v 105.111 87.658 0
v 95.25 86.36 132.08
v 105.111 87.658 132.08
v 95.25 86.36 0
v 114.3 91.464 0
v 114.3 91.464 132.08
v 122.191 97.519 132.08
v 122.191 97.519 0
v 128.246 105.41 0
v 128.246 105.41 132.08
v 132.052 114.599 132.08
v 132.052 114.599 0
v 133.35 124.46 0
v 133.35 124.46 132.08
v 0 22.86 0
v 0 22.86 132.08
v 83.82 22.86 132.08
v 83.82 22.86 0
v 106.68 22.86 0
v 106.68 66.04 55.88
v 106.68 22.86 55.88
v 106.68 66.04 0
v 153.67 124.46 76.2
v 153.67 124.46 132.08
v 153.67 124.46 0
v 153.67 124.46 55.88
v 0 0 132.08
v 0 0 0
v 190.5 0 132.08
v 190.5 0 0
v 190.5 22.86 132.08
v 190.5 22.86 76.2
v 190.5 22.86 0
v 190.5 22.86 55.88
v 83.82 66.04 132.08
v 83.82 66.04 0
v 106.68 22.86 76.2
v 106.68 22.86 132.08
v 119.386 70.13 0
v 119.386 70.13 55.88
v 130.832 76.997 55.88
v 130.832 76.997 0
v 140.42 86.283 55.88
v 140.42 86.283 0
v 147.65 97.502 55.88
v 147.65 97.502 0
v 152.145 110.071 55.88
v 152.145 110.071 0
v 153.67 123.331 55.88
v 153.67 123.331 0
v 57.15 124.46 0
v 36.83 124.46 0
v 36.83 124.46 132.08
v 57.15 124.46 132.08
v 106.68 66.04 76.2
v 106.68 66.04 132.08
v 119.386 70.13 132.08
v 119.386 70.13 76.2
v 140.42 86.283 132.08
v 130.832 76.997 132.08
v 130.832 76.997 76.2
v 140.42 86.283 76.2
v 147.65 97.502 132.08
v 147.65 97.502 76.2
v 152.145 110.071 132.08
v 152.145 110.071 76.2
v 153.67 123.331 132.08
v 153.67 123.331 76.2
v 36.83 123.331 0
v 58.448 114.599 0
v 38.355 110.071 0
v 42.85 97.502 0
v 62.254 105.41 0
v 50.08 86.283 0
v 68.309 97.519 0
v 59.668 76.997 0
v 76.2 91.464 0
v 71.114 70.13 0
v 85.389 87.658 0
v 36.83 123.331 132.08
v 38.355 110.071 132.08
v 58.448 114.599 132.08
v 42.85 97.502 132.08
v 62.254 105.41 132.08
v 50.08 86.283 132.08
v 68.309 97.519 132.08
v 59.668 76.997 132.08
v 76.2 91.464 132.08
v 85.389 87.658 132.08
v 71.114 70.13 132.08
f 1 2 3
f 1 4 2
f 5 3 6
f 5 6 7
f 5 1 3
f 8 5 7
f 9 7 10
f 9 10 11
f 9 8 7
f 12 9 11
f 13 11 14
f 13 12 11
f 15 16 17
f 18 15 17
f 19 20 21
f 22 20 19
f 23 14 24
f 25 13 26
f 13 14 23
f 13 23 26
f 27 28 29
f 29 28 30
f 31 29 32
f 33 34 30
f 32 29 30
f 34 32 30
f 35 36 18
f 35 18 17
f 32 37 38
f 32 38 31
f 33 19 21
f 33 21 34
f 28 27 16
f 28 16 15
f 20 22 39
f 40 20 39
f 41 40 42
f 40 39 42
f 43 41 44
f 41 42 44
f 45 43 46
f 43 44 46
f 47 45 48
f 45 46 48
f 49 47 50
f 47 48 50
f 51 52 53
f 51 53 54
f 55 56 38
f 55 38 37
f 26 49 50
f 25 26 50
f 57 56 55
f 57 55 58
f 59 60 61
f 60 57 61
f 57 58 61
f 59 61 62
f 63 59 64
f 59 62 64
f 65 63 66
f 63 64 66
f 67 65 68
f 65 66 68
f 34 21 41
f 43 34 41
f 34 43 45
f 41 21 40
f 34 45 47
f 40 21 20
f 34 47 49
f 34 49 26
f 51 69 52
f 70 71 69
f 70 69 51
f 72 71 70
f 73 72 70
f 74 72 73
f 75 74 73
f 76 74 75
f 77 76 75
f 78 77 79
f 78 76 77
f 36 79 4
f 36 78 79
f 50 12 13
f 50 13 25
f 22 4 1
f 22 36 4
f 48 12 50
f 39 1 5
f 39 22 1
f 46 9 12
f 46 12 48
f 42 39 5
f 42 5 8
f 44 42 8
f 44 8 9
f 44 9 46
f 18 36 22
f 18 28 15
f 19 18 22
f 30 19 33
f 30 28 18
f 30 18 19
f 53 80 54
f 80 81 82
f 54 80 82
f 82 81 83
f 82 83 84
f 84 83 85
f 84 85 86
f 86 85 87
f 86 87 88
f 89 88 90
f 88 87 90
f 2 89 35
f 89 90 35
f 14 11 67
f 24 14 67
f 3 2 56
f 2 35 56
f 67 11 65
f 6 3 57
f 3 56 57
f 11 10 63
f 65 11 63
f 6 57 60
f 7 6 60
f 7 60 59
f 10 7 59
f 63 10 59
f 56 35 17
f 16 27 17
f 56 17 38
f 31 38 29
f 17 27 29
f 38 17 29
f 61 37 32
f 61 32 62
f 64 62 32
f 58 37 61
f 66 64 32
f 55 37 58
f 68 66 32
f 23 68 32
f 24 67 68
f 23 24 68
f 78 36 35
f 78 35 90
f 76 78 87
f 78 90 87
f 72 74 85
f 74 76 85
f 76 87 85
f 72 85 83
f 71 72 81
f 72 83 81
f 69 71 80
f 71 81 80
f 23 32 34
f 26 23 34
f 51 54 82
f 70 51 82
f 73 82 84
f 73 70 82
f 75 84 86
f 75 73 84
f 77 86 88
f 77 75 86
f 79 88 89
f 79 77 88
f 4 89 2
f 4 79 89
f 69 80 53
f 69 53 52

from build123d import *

# Parameters (mm, degrees)
SKETCH1_W           = 190.5
SKETCH1_H           = 132.08
BOSS_EXTRUDE1_DEPTH = 22.86
SKETCH2_W           = 116.84
SKETCH2_H           = 132.08
BOSS_EXTRUDE2_DEPTH = 101.6
SKETCH3_W           = 20.32
SKETCH3_H           = 101.6
BOSS_EXTRUDE3_DEPTH = 36.83
SKETCH5_W           = 55.88
SKETCH5_H           = 43.18
CUT_EXTRUDE1_DEPTH  = 46.99
SKETCH4_W           = 55.88
SKETCH4_H           = 43.18
CUT_EXTRUDE2_DEPTH  = 46.99
SKETCH6_W           = 132.08
SKETCH6_H           = 43.18
CUT_EXTRUDE3_DEPTH  = 46.99
SKETCH10_W          = 76.2
SKETCH10_H          = 132.08
CUT_EXTRUDE4_DEPTH  = 38.1
CHAMFER1_SIZE       = 36.83
CHAMFER1_SIZE2      = 101.6
FILLET1_R           = 58.42
FILLET2_R           = 38.1


# Some blends are built 0.0001 mm under size
with BuildPart() as part:
    # Sketch1 → Boss-Extrude1 (new body)
    with BuildSketch(Plane(origin=(0, 0, 0), x_dir=(1, 0, 0), z_dir=(0, 1, 0))):
        with Locations((95.25, -66.04)):
            Rectangle(SKETCH1_W, SKETCH1_H)
    extrude(amount=BOSS_EXTRUDE1_DEPTH)

    # Sketch2 → Boss-Extrude2 (add)
    with BuildSketch(Plane(origin=(0, 22.86, 0), x_dir=(1, 0, 0), z_dir=(0, 1, 0))):
        with Locations((95.25, -66.04)):
            Rectangle(SKETCH2_W, SKETCH2_H)
    extrude(amount=BOSS_EXTRUDE2_DEPTH)

    # Sketch3 → Boss-Extrude3 (add)
    with BuildSketch(Plane(origin=(153.67, 0, 0), x_dir=(0, 0, -1), z_dir=(1, 0, 0))):
        with Locations((-66.04, 73.66)):
            Rectangle(SKETCH3_W, SKETCH3_H)
    extrude(amount=BOSS_EXTRUDE3_DEPTH)

    # Sketch5 → Cut-Extrude1 (cut)
    with BuildSketch(Plane(origin=(153.67, 0, 0), x_dir=(0, 0, -1), z_dir=(1, 0, 0))):
        with Locations((-27.94, 44.45)):
            Rectangle(SKETCH5_W, SKETCH5_H)
    extrude(amount=-CUT_EXTRUDE1_DEPTH, mode=Mode.SUBTRACT)

    # Sketch4 → Cut-Extrude2 (cut)
    with BuildSketch(Plane(origin=(153.67, 0, 0), x_dir=(0, 0, -1), z_dir=(1, 0, 0))):
        with Locations((-104.14, 44.45)):
            Rectangle(SKETCH4_W, SKETCH4_H)
    extrude(amount=-CUT_EXTRUDE2_DEPTH, mode=Mode.SUBTRACT)

    # Sketch6 → Cut-Extrude3 (cut)
    with BuildSketch(Plane.ZY.offset(-36.83)):
        with Locations((66.04, 44.45)):
            Rectangle(SKETCH6_W, SKETCH6_H)
    extrude(amount=-CUT_EXTRUDE3_DEPTH, mode=Mode.SUBTRACT)

    # Sketch10 → Cut-Extrude4 (cut)
    with BuildSketch(Plane(origin=(0, 124.46, 0), x_dir=(1, 0, 0), z_dir=(0, 1, 0))):
        with Locations((95.25, -66.04)):
            Rectangle(SKETCH10_W, SKETCH10_H)
    extrude(amount=-CUT_EXTRUDE4_DEPTH, mode=Mode.SUBTRACT)

    # Chamfer1
    chamfer1_edges = [part.edges().sort_by_distance(p)[0] for p in [
        (190.5, 124.46, 66.04),
    ]]
    chamfer1_side = [part.faces().sort_by_distance(p)[0] for p in [
        (149.740639098, 124.46, 66.04),
    ]]
    chamfer(chamfer1_edges, length=CHAMFER1_SIZE, length2=CHAMFER1_SIZE2, reference=chamfer1_side[0])

    # Fillet1
    # the kernel refuses this fillet: 58.42 mm, written as the material it takes off along each edge
    with BuildSketch(Plane(origin=(36.83, 66.04, 275.307343322), x_dir=(0, 1, 0), z_dir=(0, 0, -1))) as fillet1_piece_1:
        with BuildLine():
            CenterArc((57.290937329, 58.42), FILLET1_R, 191.282824288, 78.717175712)
            Line((0, 46.99), (-1.145818747, 46.7614))
            ThreePointArc((-1.145818747, 46.7614), (-1.1684, 23.495), (-1.1684, 0))
            Line((-1.1684, 0), (0, -1.1684))
            Line((0, -1.1684), (57.290937329, -1.1684))
            Line((57.290937329, -1.1684), (57.290937329, 0))
        make_face()
    extrude(amount=418.534686643, mode=Mode.SUBTRACT)
    with BuildSketch(Plane(origin=(153.67, 66.04, -143.227343322), x_dir=(-1, 0, 0), z_dir=(0, 0, 1))) as fillet1_piece_2:
        with BuildLine():
            CenterArc((58.42, -57.290937329), FILLET1_R, 101.282824288, 78.717175712)
            Line((0, -57.290937329), (-1.1684, -57.290937329))
            Line((-1.1684, -57.290937329), (-1.1684, 0))
            Line((-1.1684, 0), (0, 1.1684))
            ThreePointArc((0, 1.1684), (23.495, 1.1684), (46.7614, 1.145818747))
            Line((46.7614, 1.145818747), (46.99, 0))
        make_face()
    extrude(amount=199.107343322, mode=Mode.SUBTRACT)
    with BuildSketch(Plane(origin=(153.67, 66.04, -143.227343322), x_dir=(-1, 0, 0), z_dir=(0, 0, 1))) as fillet1_piece_3_section:
        with BuildLine():
            CenterArc((58.42, -57.290937329), FILLET1_R, 101.282824288, 78.717175712)
            Line((0, -57.290937329), (-1.1684, -57.290937329))
            Line((-1.1684, -57.290937329), (-1.1684, 0))
            Line((-1.1684, 0), (0, 1.1684))
            ThreePointArc((0, 1.1684), (23.495, 1.1684), (46.7614, 1.145818747))
            Line((46.7614, 1.145818747), (46.99, 0))
        make_face()
    fillet1_piece_3 = extrude(amount=342.334686643, mode=Mode.PRIVATE)
    fillet1_piece_3 = split(fillet1_piece_3, bisect_by=Plane(origin=(141.963702204, 79.396824985, 76.2), z_dir=(0, 0, 1)), keep=Keep.TOP, mode=Mode.PRIVATE)
    add(fillet1_piece_3, mode=Mode.SUBTRACT)
    with BuildSketch(Plane(origin=(153.67, 66.04, 275.307343322), x_dir=(0, 1, 0), z_dir=(0, 0, -1))) as fillet1_piece_4:
        with BuildLine():
            CenterArc((57.290937329, -58.42), FILLET1_R, 90, 78.717175712)
            Line((0, -46.99), (-1.145818747, -46.7614))
            ThreePointArc((-1.145818747, -46.7614), (-1.1684, -23.495), (-1.1684, 0))
            Line((-1.1684, 0), (0, 1.1684))
            Line((0, 1.1684), (57.290937329, 1.1684))
            Line((57.290937329, 1.1684), (57.290937329, 0))
        make_face()
    extrude(amount=199.107343322, mode=Mode.SUBTRACT)
    with BuildSketch(Plane(origin=(153.67, 66.04, 275.307343322), x_dir=(0, 1, 0), z_dir=(0, 0, -1))) as fillet1_piece_5_section:
        with BuildLine():
            CenterArc((57.290937329, -58.42), FILLET1_R, 90, 78.717175712)
            Line((0, -46.99), (-1.145818747, -46.7614))
            ThreePointArc((-1.145818747, -46.7614), (-1.1684, -23.495), (-1.1684, 0))
            Line((-1.1684, 0), (0, 1.1684))
            Line((0, 1.1684), (57.290937329, 1.1684))
            Line((57.290937329, 1.1684), (57.290937329, 0))
        make_face()
    fillet1_piece_5 = extrude(amount=342.334686643, mode=Mode.PRIVATE)
    fillet1_piece_5 = split(fillet1_piece_5, bisect_by=Plane(origin=(141.963702204, 79.396824985, 55.88), z_dir=(0, 0, -1)), keep=Keep.TOP, mode=Mode.PRIVATE)
    add(fillet1_piece_5, mode=Mode.SUBTRACT)

    # Fillet2
    fillet2_edges = [part.edges().sort_by_distance(p)[0] for p in [
        (133.35, 86.36, 66.04),
        (57.15, 86.36, 66.04),
    ]]
    fillet(fillet2_edges, radius=FILLET2_R - 0.0001)  # a hair under: the kernel refuses the full size


solid = part.part
